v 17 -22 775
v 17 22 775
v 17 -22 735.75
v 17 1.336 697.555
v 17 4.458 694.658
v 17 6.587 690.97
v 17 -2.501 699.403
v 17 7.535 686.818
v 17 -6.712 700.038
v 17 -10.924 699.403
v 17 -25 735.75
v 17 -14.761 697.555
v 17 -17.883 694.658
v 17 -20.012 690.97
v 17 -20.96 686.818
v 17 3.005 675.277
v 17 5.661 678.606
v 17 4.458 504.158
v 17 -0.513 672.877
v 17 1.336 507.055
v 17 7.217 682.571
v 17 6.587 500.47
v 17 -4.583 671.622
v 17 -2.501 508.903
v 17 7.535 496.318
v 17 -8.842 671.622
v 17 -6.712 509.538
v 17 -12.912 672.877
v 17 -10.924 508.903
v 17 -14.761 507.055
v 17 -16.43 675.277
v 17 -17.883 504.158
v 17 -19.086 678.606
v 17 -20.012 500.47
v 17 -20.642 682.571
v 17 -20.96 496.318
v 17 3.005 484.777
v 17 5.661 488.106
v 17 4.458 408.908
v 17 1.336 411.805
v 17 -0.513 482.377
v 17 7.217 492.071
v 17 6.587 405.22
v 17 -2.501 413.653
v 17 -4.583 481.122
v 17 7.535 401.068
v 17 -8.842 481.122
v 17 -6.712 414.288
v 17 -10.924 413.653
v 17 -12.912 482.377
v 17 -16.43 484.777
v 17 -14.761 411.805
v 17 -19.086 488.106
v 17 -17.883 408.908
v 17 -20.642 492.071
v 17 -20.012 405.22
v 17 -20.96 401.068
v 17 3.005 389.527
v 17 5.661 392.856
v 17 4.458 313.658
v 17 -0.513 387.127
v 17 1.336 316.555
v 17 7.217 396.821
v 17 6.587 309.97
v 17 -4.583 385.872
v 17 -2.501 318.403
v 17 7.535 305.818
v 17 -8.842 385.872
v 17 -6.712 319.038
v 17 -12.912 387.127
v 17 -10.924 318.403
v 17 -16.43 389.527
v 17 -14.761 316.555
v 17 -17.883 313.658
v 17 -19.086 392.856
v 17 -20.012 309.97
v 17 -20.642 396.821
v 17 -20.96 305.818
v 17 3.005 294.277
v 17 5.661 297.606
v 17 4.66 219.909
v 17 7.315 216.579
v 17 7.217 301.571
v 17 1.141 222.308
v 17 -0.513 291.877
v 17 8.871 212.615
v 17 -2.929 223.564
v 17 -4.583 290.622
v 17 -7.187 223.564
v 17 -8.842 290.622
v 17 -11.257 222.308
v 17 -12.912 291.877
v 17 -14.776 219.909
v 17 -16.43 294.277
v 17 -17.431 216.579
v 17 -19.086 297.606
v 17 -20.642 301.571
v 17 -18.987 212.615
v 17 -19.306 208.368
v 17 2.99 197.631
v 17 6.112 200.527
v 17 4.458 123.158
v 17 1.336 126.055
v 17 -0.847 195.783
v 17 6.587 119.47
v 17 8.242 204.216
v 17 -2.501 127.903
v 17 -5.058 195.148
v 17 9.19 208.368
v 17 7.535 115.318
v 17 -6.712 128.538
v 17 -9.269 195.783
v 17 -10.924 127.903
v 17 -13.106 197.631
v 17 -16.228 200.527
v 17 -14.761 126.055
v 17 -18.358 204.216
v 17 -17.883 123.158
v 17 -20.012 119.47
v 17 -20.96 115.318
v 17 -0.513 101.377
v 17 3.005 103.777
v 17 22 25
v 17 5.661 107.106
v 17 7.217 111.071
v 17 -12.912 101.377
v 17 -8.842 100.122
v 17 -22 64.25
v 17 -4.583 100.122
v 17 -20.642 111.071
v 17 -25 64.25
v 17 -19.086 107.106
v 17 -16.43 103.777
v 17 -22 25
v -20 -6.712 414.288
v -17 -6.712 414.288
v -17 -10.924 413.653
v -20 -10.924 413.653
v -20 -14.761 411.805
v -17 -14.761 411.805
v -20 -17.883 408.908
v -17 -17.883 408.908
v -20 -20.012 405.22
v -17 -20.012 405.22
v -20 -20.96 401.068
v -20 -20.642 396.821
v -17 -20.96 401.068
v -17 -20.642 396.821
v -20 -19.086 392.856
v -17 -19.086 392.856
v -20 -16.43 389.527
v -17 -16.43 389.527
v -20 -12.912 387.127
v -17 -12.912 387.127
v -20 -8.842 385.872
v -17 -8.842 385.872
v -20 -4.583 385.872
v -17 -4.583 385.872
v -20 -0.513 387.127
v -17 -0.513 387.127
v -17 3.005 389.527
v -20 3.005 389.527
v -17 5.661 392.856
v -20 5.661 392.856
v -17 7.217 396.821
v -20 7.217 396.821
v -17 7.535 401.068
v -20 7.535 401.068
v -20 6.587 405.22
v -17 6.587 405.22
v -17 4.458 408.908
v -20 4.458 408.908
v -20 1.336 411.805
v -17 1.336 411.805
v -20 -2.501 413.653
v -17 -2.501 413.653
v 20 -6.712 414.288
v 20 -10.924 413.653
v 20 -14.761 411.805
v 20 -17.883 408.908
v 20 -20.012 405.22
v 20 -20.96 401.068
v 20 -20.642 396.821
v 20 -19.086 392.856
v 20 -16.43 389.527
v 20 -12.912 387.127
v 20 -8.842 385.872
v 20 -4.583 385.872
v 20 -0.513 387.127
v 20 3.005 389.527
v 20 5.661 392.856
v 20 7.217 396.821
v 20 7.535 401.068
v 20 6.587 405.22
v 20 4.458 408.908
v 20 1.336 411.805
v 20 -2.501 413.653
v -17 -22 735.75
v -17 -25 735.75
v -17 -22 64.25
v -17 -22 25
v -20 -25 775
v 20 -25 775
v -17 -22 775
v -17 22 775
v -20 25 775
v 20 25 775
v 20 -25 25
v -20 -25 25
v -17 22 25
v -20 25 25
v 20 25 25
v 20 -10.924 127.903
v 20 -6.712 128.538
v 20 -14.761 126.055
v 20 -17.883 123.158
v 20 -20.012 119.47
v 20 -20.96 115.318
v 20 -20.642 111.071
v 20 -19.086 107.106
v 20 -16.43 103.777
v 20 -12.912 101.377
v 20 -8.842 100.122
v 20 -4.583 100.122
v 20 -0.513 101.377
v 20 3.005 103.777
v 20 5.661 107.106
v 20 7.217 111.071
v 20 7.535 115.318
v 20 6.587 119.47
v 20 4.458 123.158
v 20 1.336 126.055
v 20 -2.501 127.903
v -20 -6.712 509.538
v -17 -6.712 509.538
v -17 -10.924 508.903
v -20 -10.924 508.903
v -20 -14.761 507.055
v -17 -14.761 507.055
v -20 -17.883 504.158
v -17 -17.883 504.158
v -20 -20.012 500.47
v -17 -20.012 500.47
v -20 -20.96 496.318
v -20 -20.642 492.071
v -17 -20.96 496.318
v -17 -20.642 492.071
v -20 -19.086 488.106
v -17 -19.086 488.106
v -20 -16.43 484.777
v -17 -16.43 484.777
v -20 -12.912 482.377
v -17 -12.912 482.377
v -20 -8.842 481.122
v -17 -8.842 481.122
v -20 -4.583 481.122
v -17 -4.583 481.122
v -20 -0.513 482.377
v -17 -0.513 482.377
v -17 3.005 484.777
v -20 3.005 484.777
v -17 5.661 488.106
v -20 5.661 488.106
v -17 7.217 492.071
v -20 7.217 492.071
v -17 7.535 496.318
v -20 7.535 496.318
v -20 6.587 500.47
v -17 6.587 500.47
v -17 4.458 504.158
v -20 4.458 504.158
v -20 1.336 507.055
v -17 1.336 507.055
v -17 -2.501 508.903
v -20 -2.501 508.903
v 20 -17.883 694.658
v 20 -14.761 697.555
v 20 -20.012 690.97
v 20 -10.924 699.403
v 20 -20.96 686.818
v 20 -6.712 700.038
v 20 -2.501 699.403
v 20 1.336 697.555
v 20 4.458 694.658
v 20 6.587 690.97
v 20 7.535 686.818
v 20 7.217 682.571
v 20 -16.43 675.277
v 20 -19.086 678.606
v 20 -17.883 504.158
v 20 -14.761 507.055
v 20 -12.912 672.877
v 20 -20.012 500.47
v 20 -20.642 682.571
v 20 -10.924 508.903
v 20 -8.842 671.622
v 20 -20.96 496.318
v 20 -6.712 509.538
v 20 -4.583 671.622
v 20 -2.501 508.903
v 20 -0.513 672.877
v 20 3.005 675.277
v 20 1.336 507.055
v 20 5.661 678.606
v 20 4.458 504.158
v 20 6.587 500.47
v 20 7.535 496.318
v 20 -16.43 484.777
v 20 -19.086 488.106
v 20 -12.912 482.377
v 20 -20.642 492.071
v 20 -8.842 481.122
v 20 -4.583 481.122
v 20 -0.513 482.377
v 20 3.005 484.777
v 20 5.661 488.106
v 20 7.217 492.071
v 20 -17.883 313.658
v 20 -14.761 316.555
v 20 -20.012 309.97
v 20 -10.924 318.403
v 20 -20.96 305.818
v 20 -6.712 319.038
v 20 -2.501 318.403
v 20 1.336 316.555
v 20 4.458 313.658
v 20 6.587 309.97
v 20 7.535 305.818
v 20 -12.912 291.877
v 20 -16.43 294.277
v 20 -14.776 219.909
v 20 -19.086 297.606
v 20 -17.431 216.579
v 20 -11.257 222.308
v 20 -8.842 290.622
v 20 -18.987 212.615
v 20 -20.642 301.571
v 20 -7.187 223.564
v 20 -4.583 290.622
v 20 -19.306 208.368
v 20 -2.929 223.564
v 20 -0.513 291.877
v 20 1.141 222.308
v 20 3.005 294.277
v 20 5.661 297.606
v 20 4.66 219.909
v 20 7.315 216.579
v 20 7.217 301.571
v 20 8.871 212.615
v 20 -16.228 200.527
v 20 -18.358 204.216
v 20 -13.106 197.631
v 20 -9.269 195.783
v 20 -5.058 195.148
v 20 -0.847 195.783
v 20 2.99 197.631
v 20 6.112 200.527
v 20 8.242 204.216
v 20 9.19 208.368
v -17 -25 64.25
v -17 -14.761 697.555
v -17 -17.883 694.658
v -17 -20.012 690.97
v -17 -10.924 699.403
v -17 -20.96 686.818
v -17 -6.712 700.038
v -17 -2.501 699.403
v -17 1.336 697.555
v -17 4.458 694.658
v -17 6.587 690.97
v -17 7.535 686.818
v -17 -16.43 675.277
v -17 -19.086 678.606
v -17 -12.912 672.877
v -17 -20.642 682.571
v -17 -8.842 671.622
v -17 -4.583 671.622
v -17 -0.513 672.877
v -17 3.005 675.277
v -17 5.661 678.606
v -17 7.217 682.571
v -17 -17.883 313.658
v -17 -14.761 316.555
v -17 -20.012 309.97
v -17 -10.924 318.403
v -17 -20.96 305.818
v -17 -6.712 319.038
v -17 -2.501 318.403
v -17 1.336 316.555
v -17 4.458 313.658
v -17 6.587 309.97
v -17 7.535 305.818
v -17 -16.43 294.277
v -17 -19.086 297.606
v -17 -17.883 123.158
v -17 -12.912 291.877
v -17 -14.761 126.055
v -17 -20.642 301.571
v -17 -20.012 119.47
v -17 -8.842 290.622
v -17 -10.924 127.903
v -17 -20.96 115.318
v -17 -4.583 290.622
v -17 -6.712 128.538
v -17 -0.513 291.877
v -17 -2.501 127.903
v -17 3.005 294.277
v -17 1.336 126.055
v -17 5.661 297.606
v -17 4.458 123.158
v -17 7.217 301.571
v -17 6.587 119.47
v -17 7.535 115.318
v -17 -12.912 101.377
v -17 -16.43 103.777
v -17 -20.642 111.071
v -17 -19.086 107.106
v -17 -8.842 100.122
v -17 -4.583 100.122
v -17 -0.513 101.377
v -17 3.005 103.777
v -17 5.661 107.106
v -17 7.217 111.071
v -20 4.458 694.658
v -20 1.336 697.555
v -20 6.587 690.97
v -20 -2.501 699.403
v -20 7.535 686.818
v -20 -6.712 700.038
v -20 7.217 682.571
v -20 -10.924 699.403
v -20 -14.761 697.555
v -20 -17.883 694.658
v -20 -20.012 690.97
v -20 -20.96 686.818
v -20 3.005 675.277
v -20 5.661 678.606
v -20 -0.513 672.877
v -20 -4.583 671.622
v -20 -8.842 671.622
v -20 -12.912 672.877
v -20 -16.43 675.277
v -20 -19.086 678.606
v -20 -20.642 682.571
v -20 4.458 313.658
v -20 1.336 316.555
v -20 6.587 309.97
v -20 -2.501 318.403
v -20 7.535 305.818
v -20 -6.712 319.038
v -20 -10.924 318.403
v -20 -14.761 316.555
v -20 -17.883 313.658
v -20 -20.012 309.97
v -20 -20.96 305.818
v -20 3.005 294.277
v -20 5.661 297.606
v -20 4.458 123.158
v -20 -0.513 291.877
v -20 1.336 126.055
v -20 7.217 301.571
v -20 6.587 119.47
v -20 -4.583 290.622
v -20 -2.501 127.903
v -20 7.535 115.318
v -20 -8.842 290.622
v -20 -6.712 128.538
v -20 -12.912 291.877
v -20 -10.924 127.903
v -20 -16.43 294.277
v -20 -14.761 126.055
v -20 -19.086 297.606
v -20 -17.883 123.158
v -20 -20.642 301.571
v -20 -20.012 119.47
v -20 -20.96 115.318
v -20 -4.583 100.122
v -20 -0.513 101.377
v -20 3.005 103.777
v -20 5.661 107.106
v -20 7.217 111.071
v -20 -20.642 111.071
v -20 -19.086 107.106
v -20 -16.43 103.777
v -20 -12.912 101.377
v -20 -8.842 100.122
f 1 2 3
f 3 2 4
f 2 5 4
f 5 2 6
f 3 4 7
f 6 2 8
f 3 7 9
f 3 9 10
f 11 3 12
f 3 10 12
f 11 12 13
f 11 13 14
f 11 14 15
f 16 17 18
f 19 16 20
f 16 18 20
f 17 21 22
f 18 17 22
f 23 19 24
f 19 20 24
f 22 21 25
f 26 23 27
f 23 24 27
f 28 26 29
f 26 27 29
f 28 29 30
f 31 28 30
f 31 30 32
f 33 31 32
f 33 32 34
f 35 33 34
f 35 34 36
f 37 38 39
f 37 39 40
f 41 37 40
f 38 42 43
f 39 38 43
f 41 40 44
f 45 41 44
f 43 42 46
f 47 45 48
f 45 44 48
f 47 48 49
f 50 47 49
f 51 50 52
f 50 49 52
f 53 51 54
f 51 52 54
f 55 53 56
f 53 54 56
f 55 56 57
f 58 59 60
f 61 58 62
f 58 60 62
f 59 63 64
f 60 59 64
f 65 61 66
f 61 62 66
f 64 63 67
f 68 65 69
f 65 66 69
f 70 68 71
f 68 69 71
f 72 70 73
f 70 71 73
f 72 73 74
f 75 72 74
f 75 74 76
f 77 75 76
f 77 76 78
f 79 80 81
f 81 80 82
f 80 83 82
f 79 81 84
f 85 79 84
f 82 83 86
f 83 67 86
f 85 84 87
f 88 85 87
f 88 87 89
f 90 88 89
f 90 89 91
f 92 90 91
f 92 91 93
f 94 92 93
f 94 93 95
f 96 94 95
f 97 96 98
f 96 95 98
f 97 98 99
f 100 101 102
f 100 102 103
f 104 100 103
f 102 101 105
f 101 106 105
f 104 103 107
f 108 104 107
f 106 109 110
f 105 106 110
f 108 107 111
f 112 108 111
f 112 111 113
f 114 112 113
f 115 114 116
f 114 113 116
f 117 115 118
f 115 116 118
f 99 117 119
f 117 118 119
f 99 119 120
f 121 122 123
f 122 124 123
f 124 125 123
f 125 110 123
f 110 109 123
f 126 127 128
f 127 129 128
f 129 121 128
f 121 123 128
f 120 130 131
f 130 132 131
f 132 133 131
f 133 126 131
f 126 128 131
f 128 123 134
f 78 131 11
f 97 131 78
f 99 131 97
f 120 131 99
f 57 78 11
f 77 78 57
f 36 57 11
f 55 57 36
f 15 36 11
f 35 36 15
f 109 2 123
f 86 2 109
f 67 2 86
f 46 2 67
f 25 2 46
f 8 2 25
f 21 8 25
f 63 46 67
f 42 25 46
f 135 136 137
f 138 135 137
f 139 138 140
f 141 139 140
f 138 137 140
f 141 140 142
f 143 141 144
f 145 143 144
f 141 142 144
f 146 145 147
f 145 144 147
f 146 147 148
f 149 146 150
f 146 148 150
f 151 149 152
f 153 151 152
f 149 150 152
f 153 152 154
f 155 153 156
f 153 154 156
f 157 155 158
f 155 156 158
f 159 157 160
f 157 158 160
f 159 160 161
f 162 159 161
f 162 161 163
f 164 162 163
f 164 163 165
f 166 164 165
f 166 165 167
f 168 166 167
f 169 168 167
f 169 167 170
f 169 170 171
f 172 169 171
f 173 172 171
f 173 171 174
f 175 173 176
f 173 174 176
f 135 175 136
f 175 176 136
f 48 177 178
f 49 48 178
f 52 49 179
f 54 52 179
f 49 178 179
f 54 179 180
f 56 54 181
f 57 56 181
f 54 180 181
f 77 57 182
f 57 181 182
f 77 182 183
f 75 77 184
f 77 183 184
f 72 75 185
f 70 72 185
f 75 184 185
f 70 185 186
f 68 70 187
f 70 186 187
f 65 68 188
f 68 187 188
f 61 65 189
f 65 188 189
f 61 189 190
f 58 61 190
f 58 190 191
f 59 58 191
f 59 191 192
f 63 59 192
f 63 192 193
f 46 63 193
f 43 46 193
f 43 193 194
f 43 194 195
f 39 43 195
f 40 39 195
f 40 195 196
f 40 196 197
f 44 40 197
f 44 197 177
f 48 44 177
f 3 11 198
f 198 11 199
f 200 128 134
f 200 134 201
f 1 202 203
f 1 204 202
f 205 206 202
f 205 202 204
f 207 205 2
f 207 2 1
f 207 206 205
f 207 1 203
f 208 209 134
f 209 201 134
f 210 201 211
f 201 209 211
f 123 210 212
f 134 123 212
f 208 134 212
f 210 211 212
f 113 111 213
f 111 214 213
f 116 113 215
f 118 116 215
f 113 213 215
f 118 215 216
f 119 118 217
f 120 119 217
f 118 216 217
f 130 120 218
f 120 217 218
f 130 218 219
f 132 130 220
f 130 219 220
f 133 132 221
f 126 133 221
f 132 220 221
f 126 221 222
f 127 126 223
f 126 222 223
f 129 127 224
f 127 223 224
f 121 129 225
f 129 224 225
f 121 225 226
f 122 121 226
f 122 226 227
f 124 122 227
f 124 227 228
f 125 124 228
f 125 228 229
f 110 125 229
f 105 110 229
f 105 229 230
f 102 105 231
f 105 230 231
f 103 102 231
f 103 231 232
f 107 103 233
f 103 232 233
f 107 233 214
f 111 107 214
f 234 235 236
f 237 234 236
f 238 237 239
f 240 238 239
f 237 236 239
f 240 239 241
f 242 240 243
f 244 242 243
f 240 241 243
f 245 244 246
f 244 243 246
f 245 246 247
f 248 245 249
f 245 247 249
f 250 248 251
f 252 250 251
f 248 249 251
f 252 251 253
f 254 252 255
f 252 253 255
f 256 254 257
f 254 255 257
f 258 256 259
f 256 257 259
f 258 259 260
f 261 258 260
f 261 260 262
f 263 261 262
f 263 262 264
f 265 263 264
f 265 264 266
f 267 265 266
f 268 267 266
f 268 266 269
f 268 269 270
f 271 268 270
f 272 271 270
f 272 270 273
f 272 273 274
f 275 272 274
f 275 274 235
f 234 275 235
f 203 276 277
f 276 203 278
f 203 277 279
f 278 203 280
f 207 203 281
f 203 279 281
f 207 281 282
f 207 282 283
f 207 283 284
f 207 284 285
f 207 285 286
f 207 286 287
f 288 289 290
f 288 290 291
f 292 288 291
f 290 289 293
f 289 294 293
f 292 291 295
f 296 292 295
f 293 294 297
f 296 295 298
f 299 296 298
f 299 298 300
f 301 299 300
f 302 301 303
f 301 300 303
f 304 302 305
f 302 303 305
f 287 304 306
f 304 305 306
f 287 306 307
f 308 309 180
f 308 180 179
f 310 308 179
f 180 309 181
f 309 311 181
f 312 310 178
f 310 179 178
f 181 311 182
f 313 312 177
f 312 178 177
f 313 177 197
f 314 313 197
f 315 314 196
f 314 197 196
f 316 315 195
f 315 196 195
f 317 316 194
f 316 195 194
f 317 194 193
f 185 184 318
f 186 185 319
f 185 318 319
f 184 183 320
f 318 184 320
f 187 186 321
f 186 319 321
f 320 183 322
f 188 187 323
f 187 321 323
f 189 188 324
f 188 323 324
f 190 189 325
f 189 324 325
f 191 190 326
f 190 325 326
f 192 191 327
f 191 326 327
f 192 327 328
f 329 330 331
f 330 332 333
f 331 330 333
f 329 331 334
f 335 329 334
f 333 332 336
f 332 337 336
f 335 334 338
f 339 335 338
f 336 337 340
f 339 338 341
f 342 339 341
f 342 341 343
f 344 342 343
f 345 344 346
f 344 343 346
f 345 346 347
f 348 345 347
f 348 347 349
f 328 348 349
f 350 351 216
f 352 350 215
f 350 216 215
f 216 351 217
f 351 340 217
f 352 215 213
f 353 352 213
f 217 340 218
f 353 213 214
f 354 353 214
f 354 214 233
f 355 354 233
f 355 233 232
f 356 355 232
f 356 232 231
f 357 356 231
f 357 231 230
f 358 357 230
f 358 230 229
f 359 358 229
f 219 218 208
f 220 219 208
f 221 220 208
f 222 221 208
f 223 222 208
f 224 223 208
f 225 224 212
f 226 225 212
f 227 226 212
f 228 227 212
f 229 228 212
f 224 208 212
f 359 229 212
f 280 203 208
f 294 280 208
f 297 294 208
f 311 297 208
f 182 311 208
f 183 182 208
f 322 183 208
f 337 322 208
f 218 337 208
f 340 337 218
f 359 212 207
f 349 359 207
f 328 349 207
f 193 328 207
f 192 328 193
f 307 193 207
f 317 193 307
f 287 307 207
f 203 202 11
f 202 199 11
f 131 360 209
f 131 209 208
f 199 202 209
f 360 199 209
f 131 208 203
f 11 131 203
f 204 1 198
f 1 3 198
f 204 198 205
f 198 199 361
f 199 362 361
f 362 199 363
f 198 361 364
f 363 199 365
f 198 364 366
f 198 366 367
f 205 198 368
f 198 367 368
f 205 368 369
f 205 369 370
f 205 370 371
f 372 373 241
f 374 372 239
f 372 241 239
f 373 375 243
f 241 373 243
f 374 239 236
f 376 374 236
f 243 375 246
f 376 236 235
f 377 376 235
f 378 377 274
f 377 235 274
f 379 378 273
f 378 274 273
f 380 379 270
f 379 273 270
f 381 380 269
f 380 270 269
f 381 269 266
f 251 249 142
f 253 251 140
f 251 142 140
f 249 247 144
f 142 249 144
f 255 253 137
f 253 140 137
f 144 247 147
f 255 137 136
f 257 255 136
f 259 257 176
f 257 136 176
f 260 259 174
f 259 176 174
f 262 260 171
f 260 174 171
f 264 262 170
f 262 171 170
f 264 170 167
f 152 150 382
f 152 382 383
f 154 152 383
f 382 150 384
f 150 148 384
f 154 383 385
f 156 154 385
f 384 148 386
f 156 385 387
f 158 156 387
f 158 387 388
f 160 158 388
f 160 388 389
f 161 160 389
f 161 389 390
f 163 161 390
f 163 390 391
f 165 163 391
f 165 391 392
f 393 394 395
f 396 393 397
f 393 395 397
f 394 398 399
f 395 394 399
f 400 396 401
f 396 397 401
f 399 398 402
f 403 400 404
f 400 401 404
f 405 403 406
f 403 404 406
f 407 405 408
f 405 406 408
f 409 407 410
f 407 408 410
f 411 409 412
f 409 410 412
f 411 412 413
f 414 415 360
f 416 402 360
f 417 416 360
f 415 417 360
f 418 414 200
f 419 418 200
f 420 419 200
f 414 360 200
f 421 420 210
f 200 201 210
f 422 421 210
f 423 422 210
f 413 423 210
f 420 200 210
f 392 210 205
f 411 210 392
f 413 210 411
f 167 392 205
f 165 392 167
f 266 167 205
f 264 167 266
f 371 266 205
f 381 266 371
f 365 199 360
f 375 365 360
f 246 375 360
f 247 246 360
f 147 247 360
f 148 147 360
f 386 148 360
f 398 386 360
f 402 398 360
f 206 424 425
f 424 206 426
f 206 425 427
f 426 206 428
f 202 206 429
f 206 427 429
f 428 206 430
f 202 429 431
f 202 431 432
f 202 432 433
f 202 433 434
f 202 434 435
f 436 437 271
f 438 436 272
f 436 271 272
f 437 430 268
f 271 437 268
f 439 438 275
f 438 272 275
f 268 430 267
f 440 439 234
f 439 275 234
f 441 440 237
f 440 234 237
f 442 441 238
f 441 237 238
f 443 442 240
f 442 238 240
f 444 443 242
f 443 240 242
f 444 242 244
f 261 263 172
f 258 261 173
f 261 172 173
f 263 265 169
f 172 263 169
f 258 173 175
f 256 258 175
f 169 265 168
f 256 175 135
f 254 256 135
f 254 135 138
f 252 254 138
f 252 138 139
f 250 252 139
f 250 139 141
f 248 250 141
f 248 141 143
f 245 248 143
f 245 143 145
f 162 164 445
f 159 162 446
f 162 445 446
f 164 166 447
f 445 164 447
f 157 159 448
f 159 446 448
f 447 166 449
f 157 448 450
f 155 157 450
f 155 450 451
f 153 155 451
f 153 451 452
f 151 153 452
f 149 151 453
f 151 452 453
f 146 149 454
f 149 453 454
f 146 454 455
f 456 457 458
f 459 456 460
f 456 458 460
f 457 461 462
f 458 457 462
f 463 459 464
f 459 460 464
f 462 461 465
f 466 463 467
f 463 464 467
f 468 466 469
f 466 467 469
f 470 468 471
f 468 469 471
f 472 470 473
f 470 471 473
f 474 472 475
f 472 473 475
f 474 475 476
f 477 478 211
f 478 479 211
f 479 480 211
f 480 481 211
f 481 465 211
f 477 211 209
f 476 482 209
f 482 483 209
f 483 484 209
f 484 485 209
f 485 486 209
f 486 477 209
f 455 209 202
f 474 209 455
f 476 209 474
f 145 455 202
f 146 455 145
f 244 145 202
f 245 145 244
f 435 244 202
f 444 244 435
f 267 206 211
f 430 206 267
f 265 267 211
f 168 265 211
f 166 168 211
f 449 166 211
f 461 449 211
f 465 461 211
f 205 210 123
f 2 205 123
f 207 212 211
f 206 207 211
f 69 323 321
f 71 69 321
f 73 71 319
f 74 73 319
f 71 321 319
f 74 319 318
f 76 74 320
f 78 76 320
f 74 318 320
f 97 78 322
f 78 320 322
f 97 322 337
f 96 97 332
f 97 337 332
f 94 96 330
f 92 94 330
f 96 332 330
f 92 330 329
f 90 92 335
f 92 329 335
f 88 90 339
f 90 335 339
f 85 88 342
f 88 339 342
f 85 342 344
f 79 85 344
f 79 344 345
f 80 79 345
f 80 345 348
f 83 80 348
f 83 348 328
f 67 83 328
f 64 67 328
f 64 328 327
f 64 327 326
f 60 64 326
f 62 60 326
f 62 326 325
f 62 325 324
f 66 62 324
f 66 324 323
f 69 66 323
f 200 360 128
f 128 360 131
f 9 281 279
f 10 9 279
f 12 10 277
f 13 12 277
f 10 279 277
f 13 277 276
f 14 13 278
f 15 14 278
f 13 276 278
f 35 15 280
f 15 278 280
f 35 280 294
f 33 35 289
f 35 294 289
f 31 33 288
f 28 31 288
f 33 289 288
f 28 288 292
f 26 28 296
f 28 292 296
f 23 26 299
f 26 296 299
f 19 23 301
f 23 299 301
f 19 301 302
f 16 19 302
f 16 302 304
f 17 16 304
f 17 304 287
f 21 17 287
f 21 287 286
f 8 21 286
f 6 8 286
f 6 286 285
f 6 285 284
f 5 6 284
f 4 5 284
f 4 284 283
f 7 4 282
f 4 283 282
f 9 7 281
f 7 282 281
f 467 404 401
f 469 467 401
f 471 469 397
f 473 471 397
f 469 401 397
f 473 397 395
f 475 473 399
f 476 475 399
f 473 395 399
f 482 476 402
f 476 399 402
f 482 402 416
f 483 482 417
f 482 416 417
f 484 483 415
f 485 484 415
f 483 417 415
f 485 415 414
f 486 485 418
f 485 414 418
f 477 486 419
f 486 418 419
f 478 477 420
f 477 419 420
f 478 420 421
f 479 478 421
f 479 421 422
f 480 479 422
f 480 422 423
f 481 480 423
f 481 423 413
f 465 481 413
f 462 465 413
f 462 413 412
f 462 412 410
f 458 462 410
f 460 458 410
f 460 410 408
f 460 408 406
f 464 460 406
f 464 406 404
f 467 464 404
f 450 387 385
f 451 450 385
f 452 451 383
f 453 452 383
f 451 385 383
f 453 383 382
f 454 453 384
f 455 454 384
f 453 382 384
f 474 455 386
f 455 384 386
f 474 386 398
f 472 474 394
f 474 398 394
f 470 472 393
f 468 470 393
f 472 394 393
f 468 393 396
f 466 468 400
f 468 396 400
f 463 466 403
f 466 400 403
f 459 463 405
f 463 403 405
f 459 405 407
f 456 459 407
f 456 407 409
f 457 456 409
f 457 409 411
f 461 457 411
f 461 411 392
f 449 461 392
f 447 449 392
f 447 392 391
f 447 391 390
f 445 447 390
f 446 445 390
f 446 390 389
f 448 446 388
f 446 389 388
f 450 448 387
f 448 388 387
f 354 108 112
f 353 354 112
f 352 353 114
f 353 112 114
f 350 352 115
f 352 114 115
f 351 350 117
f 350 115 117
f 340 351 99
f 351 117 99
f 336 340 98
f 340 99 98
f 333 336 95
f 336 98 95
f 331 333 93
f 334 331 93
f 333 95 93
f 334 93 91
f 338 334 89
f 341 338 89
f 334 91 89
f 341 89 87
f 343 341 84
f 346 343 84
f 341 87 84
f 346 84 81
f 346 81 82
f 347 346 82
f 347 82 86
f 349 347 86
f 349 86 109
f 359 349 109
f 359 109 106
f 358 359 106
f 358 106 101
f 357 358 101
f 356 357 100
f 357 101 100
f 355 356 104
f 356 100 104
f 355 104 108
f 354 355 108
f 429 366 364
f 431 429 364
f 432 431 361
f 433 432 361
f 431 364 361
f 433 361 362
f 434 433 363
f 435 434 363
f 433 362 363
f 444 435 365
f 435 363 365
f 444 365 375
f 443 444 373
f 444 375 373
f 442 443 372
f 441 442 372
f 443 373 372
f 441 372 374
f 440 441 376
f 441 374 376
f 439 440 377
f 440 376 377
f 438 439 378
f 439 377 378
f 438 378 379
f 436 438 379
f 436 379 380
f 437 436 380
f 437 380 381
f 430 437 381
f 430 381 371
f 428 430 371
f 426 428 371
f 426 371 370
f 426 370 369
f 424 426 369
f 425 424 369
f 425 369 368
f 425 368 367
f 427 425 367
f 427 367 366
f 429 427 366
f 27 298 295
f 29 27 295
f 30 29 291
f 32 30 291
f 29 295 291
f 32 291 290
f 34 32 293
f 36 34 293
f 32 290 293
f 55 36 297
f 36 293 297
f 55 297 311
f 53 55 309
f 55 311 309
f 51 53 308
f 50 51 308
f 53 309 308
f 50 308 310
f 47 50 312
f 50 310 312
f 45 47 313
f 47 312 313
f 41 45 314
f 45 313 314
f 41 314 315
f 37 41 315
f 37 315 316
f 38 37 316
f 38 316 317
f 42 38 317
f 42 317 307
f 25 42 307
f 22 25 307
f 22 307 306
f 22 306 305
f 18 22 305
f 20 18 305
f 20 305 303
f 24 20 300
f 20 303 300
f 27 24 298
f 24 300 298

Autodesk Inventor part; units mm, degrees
ref_plane "Start Plane" through (0, 0, 25) normal (0, 0, 1) x (1, 0, 0)
ref_plane "End Plane" through (0, 0, 775) normal (0, 0, 1) x (1, 0, 0)
sketch "Sketch" plane through (0, 0, 0) normal (0, 0, 1) x (1, 0, 0)
  line L0 (-20, -25) -> (20, -25)
  line L1 (20, -25) -> (20, 25)
  line L2 (20, 25) -> (-20, 25)
  line L3 (-20, 25) -> (-20, -25)
  line L4 (-20, -25) -> (20, 25) construction
  line L5 (20, -25) -> (-20, 25) construction
  line L6 (-17, 22) -> (17, 22)
  line L7 (17, 22) -> (17, -22)
  line L8 (17, -22) -> (-17, -22)
  line L9 (-17, -22) -> (-17, 22)
  point P0 (0, 0)
  dimension "Width" = 40
  dimension "Height" = 50
  dimension "Thickness" = 3
extrude "Body" add sketch "Sketch" along normal up to surface (750 mm away) from surface at 25
sketch "Sketch2" plane through (0, 0, 0) normal (0, 0, 1) x (1, 0, 0)
  line L0 (0, 0) -> (10, 0)
ref_plane "Work Plane3" through (0, 0, 0) normal (0, -1, 0) x (1, 0, 0)
sketch "Sketch3" plane through (0, 0, 0) normal (0, -1, 0) x (1, 0, 0)
  line L0 (-28, 25) -> (28, 25)
  line L1 (-28, 775) -> (28, 775)
  dimension "d10" = 750
ref_plane "Work Plane5" through (628, -25, 25) normal (0, 0, -1) x (-1, 0, 0)
split "Split2" plane through (628, -25, 25) removes the side toward (0, 0, -1)
ref_plane "Work Plane6" through (-72, -25, 775) normal (0, 0, 1) x (1, 0, 0)
split "Split3" plane through (-72, -25, 775) removes the side toward (0, 0, 1)
sketch "Sketch4" plane through (-20, -25, 775) normal (-1, 0, 0) x (0, 0, 1)
  line L0 (-750, 50) -> (0, 50) projected
  line L1 (-750, 0) -> (0, 0) projected
  line L2 (-660.75, 18.2875) -> (-89.25, 18.2875)
  line L3 (-750, 3) -> (-750, 47) construction
  line L4 (-750, 25) -> (0, 25) construction
  line L5 (0, 3) -> (0, 47) construction
  line L6 (-750, 0) -> (-750, 50) projected
  line L7 (0, 0) -> (0, 50) projected
  point P0 (-775, 25)
  point P1 (-375, 18.2875)
  point P2 (-375, 0)
  dimension "d11" = 571.5
  dimension "d44" = 18.2875
hole "Hole1" at (-20, -6.7125, 114.25) direction (1, 0, 0) diameter 28.575 end through all
pattern_linear "Rectangular Pattern1" count 3 spacing 285.75 along (0, 0, 1) of "Hole1"
sketch "Sketch5" plane through (-20, -25, 775) normal (-1, 0, 0) x (0, 0, 1)
  line L0 (0, 0) -> (0, 50) projected
  line L1 (-750, 50) -> (0, 50) projected
  line L2 (-750, 0) -> (-750, 50) projected
  line L3 (-750, 0) -> (0, 0) projected
  line L4 (-775, 25) -> (25, 25)
  point P0 (-375, 17)
  point P1 (-375, 19.9091)
  point P2 (-375, 25)
  point P3 (-375, 25)
  dimension "d35" = 8
hole "Hole2" [suppressed]
sketch "Sketch7" plane through (-20, -25, 775) normal (-1, 0, 0) x (0, 0, 1)
  line L0 (-666.5, 21) -> (-83.5, 21) construction
  line L1 (-766.8103, 25) -> (25, 25) construction
  point P0 (-375, 21)
  point P1 (-375, 25)
  dimension "d36" = 583
  dimension "d40" = 4
pattern_linear "Rectangular Pattern2" count 4 spacing 190.5 along (0, 0, 1) of "Hole1"
sketch "Sketch9" plane through (20, -25, 775) normal (1, 0, 0) x (0, 0, -1)
  line L0 (0, 50) -> (750, 50) projected
  line L1 (750, 0) -> (750, 50) projected
  line L2 (0, 50) -> (750, 50) projected
  line L3 (0, 0) -> (0, 50) projected
  line L4 (0, 0) -> (750, 0) projected
  circle A0 centre (660.8, 18.2875) radius 12.7 projected
  circle A1 centre (279.75, 18.2875) radius 14.2875 projected
  circle A2 centre (470.25, 18.2875) radius 14.2875 projected
  circle A3 centre (660.75, 18.2875) radius 14.2875 projected
  circle A4 centre (375, 18.2875) radius 14.2875 projected
  circle A5 centre (89.25, 18.2875) radius 14.2875 projected
  point P0 (775, 25)
  point P1 (565.5644, 19.942)
  dimension "d57" = 95.25
  dimension "d58" = 30.058
hole "Hole4" at (20, -5.058, 209.4356) direction (-1, 0, 0) diameter 28.575 depth 10
sketch "Sketch12" plane through (17, -25, 775) normal (-1, 0, 0) x (0, 0, 1)
  point P0 (-775, 25)
sketch "Sketch13" plane through (-20, -25, 775) normal (0, -1, 0) x (1, 0, 0)
  line L0 (0, -750) -> (0, 0) projected
  line L1 (3, -750) -> (3, 0) projected
  line L2 (37, -750) -> (37, 0) projected
  line L3 (-55, -750) -> (645, -750) projected
  line L4 (-55, 0) -> (645, 0) projected
  line L5 (37, -750) -> (37, 0) projected
  line L6 (3, -710.75) -> (37, -710.75)
  line L7 (37, -710.75) -> (37, -39.25)
  line L8 (37, -39.25) -> (3, -39.25)
  line L9 (3, -39.25) -> (3, -710.75)
  point P0 (20, -775)
  point P1 (37, -375)
  point P2 (37, -375)
  point P3 (37, -39.25)
  point P4 (3, -39.25)
  point P5 (37, -710.75)
  dimension "d73" = 671.5
extrude "Extrusion4" cut sketch "Sketch13" against normal blind 10 contours L1 L8 L2 L6
sketch "Sketch14" plane through (20, -25, 775) normal (1, 0, 0) x (0, 0, -1)
  circle A0 centre (375, 18.2875) radius 14.2875 projected
  point P0 (775, 25)
equation "\"d22\" = Wheel_Seperation"
equation "\"d35\" = Wheel_HeightOffset + Wheel_CentreDrop"
equation "\"d36\" = 3 * Wheel_Seperation2"
equation "\"d40\" = Wheel_HeightOffset2"
equation "\"d43\" = Wheel_MaxSeperation2"
equation "\"d57\" = MotorholeCC"
equation "\"d58\" = OutputshaftTopOffset"
equation "\"G_OFFSET_START\" = -25"
equation "\"G_OFFSET_END\" = -25"
equation "\"d5\" = -G_OFFSET_START"
equation "\"d6\" = Length + G_OFFSET_END"
equation "\"G_L\" = 750"
equation "\"Chassi_CentreDrop\" = 4"
equation "\"WheelBay_Depth\" = 55"
equation "\"Wheel_Diametre\" = 152.4"
equation "\"Wheel_Seperation\" = 285.75"
equation "\"Wheel_HeightOffset\" = 4"
equation "\"Wheel_Clearance\" = 13.05"
equation "\"Chassi_GroundClearance\" = 10.116"
equation "\"Wheel_CentreDrop\" = 4"
equation "\"Wheel_Seperation2\" = 194.33333"
equation "\"Wheel_Diametre2\" = 101.6"
equation "\"Wheel_HeightOffset2\" = 4"
equation "\"Wheel_Clearance2\" = 32.7"
equation "\"Chain_Pitch\" = 9.525"
equation "\"Wheel_MaxSeperation\" = 285.75"
equation "\"Wheel_CCSpan\" = 571.5"
equation "\"Wheel_CCSpan2\" = 471.5"
equation "\"Wheel_MaxSeperation2\" = 190.5"
equation "\"MotorholeCC\" = 95.25"
equation "\"MotorholeHorizontal\" = 95.01318"
equation "\"OutputshaftTopOffset\" = 30.058"
equation "\"Heightfromcenter\" = 6.7125"
equation "\"Chassi_SideRivetSpacing\" = 37.5"
equation "\"Sprocket_Thickness\" = 10.668"
equation "\"BumperMountingBarOffset\" = 177.8"
equation "\"Length\" = 800"
properties part number "50x40x3" material "Aluminum 6061"
